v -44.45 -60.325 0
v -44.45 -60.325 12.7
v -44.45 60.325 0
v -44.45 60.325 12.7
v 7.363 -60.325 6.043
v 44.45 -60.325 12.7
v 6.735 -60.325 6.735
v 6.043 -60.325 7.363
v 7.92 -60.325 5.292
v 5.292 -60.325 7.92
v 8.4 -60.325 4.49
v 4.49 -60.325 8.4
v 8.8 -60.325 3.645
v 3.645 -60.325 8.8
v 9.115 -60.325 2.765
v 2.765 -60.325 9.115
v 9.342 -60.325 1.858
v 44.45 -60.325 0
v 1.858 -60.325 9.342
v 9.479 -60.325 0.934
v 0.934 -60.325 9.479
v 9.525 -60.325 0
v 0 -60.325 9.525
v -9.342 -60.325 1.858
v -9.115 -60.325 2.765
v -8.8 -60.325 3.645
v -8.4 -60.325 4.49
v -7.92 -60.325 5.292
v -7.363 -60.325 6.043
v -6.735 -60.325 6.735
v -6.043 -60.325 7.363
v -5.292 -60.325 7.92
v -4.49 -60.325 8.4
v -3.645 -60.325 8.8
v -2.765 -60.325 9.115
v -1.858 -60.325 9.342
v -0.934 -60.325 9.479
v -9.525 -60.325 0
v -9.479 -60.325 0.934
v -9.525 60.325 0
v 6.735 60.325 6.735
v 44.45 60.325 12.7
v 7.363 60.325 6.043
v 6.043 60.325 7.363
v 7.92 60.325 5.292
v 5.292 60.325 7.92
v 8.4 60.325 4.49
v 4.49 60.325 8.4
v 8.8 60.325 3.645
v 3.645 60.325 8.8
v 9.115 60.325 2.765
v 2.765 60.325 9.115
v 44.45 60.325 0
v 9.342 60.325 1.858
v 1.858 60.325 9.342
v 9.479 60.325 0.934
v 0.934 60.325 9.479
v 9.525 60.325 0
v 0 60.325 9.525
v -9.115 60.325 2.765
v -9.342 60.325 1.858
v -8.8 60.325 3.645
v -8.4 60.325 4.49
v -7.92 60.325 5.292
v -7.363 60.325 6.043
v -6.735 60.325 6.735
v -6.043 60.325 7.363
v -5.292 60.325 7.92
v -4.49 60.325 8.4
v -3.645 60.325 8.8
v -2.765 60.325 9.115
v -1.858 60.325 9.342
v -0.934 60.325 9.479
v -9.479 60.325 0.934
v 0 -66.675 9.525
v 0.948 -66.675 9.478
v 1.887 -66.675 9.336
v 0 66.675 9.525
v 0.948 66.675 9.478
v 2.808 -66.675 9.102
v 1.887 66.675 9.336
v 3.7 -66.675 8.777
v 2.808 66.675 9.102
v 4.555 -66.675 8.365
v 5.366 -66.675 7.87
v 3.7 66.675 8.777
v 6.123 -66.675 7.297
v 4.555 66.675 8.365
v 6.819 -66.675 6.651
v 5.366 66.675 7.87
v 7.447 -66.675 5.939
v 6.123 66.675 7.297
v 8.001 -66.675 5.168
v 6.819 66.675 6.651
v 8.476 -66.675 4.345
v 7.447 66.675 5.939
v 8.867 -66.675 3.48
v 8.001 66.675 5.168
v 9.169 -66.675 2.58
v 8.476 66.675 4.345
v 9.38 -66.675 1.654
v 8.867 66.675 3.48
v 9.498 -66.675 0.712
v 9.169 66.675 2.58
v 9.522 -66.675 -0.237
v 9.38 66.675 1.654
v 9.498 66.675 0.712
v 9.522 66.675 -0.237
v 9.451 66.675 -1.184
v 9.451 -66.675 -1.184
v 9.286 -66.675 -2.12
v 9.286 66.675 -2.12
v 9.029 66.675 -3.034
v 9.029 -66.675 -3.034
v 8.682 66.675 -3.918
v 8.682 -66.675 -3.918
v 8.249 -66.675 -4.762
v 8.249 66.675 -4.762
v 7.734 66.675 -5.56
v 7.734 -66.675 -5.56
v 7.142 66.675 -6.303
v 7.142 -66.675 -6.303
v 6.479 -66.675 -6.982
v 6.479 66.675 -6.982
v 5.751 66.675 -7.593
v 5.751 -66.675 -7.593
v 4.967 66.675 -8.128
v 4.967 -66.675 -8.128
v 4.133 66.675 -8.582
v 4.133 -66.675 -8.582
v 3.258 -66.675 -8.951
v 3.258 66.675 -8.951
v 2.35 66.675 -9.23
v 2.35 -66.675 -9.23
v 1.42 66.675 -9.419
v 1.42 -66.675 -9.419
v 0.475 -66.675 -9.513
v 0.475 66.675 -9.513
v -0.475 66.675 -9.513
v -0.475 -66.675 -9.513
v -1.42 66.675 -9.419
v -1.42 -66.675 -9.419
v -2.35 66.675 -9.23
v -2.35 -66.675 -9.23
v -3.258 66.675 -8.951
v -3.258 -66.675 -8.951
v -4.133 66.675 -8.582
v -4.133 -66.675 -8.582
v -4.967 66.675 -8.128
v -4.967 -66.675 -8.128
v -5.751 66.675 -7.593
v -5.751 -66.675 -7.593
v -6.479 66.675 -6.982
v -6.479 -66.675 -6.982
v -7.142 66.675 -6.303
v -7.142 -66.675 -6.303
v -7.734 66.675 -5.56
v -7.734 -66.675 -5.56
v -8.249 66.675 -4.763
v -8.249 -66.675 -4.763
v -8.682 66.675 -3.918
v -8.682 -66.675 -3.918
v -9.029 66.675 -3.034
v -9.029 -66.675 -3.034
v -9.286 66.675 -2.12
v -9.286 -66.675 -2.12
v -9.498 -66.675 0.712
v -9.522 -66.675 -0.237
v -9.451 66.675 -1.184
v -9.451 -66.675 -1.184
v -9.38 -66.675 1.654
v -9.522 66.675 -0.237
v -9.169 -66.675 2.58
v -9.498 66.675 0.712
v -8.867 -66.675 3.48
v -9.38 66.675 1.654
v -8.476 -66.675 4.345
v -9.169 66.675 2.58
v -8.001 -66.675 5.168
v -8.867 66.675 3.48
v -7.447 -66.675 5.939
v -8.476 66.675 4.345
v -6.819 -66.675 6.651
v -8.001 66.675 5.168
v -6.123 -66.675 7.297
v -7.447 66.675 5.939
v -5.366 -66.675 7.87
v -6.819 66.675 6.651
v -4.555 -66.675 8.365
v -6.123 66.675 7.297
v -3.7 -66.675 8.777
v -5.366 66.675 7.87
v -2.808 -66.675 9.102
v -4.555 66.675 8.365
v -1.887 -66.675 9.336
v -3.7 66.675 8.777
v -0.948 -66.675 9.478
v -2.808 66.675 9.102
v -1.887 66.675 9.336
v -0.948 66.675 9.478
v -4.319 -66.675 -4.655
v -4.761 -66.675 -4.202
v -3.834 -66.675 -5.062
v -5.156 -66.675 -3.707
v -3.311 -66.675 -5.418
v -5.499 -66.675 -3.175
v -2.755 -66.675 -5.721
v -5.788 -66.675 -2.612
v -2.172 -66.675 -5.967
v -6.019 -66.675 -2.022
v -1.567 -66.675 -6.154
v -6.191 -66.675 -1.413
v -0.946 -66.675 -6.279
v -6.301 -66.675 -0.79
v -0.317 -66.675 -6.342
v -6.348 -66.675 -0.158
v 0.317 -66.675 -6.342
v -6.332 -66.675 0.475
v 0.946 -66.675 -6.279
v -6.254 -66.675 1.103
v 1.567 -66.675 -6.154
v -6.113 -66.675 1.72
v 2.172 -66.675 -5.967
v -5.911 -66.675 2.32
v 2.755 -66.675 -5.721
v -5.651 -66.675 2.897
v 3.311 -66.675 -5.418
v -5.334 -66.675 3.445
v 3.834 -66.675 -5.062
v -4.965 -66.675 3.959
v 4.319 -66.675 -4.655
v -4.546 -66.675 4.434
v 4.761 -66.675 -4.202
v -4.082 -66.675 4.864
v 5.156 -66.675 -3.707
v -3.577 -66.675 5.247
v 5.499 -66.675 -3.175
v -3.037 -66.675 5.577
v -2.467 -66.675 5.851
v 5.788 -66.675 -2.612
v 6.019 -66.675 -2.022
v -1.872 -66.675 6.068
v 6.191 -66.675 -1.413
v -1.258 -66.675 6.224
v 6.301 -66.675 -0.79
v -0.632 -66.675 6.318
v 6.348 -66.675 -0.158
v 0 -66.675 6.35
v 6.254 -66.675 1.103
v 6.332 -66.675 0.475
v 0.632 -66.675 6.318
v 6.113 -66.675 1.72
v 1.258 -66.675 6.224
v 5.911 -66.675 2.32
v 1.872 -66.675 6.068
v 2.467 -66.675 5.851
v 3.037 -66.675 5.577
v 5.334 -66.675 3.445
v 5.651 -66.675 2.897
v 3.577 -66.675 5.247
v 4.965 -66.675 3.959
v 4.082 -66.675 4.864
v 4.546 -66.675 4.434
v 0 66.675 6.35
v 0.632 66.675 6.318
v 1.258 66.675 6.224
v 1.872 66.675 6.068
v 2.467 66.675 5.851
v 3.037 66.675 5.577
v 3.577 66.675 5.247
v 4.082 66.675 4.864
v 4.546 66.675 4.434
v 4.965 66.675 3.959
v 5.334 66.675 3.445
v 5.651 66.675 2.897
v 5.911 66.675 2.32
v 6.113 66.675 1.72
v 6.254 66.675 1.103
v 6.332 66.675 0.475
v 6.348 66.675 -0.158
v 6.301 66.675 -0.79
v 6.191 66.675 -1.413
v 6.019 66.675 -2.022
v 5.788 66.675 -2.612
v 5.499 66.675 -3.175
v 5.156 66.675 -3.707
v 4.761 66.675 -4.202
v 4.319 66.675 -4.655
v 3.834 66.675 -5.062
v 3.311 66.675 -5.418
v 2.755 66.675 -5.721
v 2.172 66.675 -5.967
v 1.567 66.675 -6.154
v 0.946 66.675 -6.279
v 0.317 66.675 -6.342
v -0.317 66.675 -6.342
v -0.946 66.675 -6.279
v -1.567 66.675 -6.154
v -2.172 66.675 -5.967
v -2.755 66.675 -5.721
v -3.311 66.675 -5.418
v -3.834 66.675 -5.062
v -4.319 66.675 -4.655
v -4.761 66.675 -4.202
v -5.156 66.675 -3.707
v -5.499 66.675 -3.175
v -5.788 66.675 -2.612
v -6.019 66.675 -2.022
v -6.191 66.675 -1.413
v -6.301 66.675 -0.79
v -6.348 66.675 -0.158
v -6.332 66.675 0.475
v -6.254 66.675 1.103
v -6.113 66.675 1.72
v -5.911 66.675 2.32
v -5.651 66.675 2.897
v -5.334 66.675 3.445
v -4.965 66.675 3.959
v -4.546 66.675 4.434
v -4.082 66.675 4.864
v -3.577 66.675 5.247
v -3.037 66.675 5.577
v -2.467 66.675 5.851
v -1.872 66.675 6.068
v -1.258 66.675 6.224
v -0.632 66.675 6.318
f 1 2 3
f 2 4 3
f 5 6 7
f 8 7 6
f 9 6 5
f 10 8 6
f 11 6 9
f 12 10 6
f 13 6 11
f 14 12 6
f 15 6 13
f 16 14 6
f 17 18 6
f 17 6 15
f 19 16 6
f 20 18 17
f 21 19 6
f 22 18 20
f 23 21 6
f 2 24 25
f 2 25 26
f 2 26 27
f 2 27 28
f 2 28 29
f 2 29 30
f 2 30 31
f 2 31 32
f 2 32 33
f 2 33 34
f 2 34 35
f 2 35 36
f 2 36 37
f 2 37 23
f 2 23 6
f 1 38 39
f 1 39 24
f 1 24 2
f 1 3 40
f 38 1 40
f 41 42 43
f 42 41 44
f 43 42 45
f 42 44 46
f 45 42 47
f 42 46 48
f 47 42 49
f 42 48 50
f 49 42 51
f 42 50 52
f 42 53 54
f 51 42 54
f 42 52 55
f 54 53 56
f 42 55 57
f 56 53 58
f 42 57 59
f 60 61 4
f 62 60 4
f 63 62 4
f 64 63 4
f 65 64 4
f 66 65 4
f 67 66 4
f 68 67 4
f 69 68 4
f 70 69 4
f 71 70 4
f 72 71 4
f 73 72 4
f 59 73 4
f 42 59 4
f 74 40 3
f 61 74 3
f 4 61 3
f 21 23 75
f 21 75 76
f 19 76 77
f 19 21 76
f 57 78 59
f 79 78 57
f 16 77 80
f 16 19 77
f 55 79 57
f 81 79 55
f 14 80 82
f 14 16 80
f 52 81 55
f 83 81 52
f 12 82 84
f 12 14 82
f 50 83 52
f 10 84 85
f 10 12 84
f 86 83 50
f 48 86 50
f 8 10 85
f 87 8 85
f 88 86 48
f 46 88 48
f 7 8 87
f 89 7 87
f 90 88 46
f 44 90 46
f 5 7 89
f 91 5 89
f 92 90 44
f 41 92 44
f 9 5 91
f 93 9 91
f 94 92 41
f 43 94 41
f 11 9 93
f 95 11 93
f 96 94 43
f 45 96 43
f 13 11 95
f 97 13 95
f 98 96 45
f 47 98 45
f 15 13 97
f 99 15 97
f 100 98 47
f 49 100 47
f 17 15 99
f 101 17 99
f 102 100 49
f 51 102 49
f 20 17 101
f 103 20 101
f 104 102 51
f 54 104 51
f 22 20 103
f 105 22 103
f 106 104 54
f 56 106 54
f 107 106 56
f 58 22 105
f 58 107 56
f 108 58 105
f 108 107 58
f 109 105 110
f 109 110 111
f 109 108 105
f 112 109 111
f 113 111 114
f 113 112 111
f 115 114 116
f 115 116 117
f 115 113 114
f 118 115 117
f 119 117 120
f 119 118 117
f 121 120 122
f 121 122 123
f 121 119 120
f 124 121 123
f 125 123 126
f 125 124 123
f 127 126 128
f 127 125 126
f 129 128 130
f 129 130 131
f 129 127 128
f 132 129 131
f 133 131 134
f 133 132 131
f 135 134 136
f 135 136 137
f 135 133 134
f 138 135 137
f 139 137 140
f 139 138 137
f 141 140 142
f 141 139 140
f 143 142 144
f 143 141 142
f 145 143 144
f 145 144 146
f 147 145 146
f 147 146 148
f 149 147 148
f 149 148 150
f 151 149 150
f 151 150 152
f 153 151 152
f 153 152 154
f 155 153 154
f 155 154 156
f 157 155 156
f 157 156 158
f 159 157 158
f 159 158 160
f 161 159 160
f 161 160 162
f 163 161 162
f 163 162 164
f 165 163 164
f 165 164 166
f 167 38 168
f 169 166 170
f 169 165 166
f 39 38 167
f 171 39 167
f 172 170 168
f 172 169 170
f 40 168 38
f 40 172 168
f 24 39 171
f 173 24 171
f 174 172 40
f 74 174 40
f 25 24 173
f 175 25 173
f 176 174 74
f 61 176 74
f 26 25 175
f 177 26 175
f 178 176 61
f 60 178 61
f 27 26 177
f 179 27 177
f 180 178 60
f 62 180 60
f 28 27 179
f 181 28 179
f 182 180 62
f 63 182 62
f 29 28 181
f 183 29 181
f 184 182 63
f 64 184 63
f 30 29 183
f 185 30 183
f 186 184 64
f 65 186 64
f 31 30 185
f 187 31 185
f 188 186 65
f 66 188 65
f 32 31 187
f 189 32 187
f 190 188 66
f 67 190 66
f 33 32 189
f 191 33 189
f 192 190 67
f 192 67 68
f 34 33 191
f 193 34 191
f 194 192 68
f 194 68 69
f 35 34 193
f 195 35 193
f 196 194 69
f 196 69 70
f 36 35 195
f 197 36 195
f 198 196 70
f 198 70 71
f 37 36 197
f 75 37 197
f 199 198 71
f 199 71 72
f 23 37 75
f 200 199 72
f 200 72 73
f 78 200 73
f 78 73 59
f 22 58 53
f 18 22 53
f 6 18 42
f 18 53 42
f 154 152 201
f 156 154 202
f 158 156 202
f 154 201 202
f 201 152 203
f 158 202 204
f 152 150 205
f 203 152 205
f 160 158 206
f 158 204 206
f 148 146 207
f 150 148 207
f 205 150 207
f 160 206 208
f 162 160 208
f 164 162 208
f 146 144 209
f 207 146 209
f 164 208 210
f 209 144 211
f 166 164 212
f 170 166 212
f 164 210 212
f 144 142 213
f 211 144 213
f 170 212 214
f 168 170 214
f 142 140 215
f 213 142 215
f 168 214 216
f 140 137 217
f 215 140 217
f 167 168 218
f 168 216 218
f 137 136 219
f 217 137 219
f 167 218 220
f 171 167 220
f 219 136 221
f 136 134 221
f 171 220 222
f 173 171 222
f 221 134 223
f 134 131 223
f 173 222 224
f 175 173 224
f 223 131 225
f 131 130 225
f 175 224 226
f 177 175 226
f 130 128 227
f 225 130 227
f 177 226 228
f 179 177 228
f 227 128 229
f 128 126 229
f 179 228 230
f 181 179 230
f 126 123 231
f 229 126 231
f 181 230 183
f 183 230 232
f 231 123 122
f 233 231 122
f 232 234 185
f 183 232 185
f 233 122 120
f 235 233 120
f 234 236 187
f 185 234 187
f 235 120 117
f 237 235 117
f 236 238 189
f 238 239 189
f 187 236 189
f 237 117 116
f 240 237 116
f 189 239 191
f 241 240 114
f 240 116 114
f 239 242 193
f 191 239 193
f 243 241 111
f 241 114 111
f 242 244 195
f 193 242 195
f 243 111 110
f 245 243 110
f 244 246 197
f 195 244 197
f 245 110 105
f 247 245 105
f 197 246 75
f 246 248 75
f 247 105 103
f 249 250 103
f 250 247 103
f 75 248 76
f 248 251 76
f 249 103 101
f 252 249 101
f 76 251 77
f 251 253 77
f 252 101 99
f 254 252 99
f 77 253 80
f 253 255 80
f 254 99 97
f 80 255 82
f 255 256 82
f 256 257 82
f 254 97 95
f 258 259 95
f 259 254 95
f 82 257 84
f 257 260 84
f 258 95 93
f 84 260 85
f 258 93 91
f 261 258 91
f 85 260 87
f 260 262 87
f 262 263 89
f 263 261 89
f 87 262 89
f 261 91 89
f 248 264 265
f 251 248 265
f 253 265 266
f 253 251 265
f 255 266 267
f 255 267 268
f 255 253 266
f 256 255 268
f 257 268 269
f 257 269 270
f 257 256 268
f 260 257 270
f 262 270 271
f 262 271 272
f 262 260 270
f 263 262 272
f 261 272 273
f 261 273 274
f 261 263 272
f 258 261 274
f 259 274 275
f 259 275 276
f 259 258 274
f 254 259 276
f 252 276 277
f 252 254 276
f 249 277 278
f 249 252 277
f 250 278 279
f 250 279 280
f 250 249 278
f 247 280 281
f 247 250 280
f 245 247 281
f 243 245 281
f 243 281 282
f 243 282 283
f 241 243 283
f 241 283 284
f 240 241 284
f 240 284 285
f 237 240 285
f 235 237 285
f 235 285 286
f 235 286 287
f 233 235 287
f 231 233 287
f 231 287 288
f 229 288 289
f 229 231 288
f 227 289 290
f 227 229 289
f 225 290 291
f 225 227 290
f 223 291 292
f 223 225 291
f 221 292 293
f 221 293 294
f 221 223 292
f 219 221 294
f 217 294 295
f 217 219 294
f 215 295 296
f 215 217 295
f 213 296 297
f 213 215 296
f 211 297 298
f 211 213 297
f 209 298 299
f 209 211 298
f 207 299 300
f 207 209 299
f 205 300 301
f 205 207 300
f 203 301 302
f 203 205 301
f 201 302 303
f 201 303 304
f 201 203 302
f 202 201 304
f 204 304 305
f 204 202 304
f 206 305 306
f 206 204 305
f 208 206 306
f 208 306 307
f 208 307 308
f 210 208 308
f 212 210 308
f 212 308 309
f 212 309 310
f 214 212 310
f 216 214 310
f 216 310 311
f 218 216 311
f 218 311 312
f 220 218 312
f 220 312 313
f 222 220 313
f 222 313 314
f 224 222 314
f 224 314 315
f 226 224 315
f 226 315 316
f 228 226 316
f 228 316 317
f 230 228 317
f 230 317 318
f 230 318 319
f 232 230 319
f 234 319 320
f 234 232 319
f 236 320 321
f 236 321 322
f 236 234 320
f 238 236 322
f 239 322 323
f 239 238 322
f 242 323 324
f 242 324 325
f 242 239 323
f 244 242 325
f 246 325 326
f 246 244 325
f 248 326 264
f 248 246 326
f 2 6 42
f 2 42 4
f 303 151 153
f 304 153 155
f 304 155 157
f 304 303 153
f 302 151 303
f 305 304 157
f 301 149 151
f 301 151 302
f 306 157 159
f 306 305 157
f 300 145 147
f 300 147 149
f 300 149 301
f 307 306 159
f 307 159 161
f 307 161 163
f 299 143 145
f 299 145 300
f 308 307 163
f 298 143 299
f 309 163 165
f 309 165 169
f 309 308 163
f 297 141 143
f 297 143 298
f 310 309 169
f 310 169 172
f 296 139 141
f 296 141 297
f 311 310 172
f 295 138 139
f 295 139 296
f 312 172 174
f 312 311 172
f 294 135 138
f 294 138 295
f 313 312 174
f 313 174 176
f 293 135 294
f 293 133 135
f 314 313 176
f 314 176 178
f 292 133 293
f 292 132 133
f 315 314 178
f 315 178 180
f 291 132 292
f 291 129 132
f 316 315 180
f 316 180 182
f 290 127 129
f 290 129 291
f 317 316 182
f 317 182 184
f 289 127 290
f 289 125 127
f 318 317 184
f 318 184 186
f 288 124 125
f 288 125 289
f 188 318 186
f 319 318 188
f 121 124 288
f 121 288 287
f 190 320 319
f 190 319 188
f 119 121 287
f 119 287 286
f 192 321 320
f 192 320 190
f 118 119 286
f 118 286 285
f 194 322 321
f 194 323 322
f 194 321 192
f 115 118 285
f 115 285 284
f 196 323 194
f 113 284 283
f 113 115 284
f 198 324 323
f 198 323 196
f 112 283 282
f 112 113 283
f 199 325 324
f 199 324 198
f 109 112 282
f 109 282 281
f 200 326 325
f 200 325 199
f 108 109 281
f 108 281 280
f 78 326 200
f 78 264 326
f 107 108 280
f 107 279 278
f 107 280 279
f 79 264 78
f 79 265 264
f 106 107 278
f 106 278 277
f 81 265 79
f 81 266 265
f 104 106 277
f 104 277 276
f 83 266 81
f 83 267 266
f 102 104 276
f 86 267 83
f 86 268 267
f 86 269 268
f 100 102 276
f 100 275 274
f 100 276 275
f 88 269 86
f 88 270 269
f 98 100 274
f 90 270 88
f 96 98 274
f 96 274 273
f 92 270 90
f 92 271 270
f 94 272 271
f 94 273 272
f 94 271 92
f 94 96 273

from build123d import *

# Parameters (mm, degrees)
SKETCH1_R           = 9.525
SKETCH1_R_2         = 6.35
BOSS_EXTRUDE1_DEPTH = 66.675
BOSS_EXTRUDE2_DEPTH = 60.325


with BuildPart() as part:
    # Sketch1 → Boss-Extrude1 (new, symmetric)
    with BuildSketch(Plane(origin=(0, 0, 0), x_dir=(1, 0, 0), z_dir=(0, 1, 0))):
        with Locations(Location((0, 0, 0), (0, 0, 270))):
            Circle(SKETCH1_R)
        with Locations(Location((0, 0, 0), (0, 0, 270))):
            Circle(SKETCH1_R_2, mode=Mode.SUBTRACT)
    extrude(amount=BOSS_EXTRUDE1_DEPTH, both=True)

    # Sketch2 → Boss-Extrude2 (add, symmetric)
    with BuildSketch(Plane(origin=(0, 0, 0), x_dir=(1, 0, 0), z_dir=(0, 1, 0))):
        with BuildLine():
            Line((9.525, 0), (44.45, 0))
            Line((44.45, 0), (44.45, -12.7))
            Line((44.45, -12.7), (-44.45, -12.7))
            Line((-44.45, -12.7), (-44.45, 0))
            Line((-44.45, 0), (-9.525, 0))
            ThreePointArc((-9.525, 0), (0, -9.525), (9.525, 0))
        make_face()
    extrude(amount=BOSS_EXTRUDE2_DEPTH, both=True)


solid = part.part
